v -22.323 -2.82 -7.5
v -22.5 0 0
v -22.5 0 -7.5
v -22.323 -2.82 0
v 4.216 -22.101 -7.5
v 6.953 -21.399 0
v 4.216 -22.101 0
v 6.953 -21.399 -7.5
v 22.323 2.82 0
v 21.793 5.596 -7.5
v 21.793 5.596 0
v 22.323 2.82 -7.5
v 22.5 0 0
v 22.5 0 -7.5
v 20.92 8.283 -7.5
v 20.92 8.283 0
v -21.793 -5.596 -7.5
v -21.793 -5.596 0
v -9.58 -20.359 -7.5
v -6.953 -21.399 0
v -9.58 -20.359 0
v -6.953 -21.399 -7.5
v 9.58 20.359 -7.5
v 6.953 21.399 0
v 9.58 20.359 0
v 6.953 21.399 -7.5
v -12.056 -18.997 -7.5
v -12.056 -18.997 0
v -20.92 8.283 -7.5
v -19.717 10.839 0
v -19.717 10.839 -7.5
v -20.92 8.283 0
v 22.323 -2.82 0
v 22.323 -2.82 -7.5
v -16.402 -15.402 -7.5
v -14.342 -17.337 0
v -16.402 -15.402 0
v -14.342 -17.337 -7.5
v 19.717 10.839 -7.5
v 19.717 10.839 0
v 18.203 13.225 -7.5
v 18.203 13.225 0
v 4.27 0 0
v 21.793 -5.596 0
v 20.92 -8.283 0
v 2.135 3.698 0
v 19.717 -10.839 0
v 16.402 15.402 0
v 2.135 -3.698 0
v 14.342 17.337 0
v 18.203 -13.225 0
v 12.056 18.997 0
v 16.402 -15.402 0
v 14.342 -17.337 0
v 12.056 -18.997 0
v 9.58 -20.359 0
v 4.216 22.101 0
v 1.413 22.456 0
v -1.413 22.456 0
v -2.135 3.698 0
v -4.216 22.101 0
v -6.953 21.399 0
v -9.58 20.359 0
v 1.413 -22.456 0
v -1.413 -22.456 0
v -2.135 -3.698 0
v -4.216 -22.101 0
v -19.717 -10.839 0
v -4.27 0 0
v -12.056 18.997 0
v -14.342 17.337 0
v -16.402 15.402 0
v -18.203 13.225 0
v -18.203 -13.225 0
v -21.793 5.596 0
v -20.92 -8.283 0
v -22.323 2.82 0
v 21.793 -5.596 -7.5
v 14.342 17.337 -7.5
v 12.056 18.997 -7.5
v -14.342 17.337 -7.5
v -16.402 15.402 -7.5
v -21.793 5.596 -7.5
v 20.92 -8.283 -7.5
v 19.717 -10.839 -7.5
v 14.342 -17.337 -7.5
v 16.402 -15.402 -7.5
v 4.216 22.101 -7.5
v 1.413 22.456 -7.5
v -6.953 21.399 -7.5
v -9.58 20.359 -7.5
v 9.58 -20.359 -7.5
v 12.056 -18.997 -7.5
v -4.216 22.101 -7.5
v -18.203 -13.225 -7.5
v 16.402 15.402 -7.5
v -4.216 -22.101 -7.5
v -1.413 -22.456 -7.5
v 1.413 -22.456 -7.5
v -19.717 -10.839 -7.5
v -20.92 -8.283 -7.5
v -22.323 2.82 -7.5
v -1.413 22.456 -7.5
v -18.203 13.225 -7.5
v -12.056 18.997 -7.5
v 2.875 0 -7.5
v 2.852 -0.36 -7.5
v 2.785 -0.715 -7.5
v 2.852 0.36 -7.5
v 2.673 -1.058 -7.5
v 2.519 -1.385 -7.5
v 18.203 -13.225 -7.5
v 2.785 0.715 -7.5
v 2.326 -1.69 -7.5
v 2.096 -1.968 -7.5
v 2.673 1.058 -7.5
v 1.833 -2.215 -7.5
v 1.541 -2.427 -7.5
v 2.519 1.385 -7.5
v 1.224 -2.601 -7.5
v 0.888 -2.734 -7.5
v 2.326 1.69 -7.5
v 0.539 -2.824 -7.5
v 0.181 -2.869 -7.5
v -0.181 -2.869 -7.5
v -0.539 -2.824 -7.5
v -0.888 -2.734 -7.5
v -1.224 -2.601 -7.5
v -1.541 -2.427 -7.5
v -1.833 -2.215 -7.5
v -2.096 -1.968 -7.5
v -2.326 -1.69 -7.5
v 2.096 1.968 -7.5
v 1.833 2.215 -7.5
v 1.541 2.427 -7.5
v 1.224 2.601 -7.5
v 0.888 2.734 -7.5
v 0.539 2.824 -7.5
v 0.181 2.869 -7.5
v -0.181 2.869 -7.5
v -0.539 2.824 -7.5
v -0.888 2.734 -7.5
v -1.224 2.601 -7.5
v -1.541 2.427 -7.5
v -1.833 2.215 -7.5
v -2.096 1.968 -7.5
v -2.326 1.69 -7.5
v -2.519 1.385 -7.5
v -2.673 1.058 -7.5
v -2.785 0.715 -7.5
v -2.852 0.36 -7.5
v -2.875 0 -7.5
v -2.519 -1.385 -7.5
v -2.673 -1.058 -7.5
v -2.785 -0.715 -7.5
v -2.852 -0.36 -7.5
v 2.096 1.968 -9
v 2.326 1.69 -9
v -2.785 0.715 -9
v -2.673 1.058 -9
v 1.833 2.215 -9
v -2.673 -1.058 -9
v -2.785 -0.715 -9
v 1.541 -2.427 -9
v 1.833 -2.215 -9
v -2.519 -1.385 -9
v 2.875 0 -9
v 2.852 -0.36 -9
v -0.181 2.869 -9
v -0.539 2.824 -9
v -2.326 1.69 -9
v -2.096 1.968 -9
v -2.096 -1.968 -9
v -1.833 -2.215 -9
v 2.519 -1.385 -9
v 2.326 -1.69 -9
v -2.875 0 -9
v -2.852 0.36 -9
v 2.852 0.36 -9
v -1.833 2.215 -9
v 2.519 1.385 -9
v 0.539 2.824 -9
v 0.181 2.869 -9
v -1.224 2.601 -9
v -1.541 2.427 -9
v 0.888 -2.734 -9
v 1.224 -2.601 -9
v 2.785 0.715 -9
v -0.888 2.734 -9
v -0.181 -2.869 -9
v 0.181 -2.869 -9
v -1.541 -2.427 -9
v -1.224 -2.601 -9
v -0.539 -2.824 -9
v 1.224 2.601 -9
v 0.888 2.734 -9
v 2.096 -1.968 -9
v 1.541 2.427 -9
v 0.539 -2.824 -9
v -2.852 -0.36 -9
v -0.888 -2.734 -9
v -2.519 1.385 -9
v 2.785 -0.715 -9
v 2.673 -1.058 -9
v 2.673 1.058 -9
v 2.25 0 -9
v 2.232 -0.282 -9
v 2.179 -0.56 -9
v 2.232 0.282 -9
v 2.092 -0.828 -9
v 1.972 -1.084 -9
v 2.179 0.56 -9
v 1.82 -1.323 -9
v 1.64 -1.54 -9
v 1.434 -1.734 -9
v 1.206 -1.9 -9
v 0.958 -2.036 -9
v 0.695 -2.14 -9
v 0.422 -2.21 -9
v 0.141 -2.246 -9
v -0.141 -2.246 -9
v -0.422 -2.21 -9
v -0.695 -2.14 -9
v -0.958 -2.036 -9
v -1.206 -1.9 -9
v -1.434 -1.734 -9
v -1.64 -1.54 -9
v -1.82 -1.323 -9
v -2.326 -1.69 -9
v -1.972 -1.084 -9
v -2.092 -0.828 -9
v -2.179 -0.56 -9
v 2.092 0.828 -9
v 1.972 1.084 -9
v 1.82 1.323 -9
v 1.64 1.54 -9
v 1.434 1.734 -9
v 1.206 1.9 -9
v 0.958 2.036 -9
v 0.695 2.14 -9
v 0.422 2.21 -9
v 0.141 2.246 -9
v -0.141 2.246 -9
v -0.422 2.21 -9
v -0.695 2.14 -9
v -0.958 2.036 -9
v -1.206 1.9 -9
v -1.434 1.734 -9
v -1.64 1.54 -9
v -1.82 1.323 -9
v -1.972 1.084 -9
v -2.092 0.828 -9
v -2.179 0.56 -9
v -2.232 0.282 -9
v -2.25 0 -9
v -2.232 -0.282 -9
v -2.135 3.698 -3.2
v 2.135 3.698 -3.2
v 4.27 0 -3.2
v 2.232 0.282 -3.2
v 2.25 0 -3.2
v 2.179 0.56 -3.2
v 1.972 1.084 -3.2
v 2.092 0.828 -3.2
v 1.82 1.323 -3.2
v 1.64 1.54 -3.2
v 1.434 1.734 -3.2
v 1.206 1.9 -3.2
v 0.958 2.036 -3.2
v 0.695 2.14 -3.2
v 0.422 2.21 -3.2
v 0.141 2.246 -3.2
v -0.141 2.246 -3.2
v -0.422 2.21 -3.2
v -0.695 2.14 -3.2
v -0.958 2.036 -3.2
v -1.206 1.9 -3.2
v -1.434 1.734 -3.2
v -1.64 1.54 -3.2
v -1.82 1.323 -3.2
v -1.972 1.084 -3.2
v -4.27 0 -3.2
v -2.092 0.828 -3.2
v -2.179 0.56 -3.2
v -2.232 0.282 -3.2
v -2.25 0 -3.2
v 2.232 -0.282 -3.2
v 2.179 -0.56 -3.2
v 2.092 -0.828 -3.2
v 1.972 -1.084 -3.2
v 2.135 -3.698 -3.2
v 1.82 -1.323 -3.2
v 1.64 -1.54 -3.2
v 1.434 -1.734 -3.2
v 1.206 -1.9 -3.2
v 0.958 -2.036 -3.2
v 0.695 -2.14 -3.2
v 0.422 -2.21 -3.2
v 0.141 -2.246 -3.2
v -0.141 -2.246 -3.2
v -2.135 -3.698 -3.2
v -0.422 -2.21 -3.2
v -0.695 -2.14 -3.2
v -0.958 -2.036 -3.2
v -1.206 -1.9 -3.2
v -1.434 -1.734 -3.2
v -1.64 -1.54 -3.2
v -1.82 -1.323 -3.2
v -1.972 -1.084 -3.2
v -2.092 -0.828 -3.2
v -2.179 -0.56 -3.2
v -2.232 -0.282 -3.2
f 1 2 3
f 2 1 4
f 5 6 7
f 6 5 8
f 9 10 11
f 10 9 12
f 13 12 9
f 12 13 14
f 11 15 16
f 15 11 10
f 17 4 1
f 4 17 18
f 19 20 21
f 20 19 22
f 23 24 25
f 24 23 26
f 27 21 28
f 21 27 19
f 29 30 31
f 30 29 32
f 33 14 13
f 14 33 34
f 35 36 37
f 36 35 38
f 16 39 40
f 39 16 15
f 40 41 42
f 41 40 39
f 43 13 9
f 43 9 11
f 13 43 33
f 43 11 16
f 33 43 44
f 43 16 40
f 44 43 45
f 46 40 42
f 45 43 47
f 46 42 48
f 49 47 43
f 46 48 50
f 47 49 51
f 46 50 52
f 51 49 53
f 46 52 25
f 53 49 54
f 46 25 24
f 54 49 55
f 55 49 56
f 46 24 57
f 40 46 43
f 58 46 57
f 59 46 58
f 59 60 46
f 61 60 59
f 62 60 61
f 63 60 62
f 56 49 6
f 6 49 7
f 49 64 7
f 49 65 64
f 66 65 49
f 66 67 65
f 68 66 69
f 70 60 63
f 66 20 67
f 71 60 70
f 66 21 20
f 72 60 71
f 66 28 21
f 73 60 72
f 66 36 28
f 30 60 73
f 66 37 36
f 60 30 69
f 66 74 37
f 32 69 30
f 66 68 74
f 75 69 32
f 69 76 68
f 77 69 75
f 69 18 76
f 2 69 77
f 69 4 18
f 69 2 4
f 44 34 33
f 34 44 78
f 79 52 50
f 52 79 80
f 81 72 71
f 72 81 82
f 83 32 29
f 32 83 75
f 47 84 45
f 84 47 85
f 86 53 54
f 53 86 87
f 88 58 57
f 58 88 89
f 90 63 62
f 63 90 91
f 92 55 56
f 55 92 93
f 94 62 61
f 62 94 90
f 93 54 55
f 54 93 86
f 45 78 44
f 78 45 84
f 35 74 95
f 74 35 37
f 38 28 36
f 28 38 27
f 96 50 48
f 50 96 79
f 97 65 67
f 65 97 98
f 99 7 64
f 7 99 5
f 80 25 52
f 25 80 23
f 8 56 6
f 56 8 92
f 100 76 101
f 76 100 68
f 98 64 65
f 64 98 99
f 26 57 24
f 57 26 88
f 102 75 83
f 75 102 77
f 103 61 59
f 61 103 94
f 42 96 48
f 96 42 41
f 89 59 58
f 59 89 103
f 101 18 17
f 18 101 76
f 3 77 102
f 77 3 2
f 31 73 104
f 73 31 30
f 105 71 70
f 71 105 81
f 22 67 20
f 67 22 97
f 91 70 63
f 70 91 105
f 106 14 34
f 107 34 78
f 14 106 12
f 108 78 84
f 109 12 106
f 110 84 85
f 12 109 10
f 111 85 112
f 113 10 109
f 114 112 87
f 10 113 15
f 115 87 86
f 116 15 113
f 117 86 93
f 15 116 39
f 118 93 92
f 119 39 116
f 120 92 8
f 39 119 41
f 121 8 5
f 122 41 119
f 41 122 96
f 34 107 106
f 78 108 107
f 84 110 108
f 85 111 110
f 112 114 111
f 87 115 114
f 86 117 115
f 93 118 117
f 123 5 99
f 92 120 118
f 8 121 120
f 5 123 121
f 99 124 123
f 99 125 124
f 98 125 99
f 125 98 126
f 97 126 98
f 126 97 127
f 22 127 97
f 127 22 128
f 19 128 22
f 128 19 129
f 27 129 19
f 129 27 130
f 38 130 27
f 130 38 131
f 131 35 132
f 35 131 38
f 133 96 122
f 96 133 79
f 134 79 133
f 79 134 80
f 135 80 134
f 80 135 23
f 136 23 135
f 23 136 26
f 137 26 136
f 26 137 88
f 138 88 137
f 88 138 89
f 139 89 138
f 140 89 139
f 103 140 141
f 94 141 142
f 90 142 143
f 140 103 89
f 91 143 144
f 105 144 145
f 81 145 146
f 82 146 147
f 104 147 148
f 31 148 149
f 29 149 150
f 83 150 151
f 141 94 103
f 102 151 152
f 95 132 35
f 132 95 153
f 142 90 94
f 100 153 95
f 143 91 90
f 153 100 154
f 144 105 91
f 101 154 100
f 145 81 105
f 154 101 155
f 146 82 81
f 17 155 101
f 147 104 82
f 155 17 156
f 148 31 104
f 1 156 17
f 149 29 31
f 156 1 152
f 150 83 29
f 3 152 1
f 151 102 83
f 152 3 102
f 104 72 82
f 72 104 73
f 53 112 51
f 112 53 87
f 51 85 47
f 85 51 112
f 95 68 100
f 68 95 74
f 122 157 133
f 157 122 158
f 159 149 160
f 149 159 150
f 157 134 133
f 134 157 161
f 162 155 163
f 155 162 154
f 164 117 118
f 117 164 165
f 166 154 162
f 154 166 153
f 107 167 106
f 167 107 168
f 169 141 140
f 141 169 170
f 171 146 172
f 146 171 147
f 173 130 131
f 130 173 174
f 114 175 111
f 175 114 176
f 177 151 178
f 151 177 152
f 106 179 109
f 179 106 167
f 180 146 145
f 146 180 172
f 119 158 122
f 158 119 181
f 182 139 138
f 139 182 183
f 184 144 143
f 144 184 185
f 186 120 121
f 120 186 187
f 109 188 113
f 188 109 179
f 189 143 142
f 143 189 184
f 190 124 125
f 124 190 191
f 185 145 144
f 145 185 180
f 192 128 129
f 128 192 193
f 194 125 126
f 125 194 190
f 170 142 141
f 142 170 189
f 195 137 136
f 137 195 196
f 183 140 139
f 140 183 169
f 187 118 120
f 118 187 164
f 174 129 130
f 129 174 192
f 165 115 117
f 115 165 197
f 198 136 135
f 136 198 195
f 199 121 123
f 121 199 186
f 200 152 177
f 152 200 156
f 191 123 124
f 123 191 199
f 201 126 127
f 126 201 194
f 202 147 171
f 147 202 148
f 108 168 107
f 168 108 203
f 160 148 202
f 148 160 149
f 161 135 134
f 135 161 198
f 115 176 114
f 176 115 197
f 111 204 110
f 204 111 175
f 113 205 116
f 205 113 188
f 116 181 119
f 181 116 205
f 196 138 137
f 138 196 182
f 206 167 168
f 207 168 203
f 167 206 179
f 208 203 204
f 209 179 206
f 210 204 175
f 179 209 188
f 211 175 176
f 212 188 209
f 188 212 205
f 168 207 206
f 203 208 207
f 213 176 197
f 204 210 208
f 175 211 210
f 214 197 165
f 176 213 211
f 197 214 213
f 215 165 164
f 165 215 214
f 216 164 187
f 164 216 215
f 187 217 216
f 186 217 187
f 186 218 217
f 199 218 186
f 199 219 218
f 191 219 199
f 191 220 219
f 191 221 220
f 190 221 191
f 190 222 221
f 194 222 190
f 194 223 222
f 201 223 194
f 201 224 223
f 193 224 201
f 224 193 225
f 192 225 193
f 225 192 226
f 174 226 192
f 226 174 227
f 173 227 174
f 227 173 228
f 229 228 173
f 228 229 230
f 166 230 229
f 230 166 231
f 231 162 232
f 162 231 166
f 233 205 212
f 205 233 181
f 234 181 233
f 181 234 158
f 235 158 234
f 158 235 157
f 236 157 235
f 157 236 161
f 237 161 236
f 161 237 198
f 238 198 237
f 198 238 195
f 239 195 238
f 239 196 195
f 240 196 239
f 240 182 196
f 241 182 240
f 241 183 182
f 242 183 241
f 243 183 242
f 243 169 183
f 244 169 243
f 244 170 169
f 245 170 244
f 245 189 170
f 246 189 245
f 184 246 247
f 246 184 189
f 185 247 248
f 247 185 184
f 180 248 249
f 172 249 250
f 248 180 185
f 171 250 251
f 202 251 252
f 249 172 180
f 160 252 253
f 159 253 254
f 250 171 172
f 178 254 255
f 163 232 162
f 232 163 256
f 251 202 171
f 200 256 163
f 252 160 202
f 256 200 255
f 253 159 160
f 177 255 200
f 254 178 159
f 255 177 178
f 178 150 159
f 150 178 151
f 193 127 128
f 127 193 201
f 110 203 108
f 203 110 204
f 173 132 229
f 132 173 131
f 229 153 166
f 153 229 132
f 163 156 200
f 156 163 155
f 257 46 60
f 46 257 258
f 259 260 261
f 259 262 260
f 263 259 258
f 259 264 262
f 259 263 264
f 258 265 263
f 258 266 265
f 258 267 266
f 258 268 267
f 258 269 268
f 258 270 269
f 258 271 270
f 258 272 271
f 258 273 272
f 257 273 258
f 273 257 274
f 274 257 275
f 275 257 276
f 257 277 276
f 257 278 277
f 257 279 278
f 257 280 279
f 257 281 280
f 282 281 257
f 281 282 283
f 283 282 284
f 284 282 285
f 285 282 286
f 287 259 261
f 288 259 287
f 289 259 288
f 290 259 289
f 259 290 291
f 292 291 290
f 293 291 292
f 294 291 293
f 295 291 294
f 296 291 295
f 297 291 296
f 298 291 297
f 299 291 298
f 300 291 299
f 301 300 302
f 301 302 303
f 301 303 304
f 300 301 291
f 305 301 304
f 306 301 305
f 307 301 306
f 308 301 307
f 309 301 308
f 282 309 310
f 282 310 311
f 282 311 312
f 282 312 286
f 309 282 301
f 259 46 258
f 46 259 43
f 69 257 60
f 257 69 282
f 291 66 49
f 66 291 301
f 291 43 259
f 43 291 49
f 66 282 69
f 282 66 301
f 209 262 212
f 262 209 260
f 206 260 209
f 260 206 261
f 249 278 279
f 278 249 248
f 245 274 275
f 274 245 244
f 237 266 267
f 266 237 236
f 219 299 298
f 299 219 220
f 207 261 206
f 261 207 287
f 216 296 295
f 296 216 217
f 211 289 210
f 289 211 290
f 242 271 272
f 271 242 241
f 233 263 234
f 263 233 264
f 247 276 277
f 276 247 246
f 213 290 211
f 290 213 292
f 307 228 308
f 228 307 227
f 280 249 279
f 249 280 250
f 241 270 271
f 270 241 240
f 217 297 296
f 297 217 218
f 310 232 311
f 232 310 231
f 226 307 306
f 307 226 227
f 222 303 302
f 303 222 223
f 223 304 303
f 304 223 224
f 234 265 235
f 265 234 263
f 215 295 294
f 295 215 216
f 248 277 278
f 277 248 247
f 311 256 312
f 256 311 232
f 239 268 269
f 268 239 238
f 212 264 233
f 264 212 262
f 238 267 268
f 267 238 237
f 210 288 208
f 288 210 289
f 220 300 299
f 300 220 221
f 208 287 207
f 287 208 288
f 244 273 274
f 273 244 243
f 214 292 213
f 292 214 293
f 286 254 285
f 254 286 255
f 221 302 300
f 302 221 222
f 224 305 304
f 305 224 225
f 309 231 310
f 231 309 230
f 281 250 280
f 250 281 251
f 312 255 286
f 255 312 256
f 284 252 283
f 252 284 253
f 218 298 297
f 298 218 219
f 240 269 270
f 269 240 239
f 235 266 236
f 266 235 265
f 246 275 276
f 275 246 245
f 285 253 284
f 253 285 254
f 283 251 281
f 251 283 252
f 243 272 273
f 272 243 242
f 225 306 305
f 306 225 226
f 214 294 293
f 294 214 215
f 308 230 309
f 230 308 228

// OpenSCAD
$fn = 50;

difference() {
	union() {
		translate(v = [0, 0, -7.5]) {
			cylinder(h = 7.5, r = 22.5);
		}
		#translate(v = [0, 0, -9.0]) {
			cylinder(h = 9, r = 2.875);
		}
	}
	union() {
		translate(v = [0, 0, 0]) {
			rotate(a = [0, 0, 0]) {
				difference() {
					union() {
						translate(v = [0, 0, -3.2]) {
							linear_extrude(height = 3.2) {
								polygon(points = [[4.2698, 0.0], [2.1349000000000005, 3.697755269078796], [-2.134899999999999, 3.6977552690787965], [-4.2698, 5.228996902999369e-16], [-2.134900000000002, -3.6977552690787956], [2.1348999999999974, -3.697755269078798]]);
							}
						}
					}
					union();
				}
			}
		}
		#translate(v = [0, 0, -100.0]) {
			cylinder(h = 200, r = 2.25);
		}
	}
}
